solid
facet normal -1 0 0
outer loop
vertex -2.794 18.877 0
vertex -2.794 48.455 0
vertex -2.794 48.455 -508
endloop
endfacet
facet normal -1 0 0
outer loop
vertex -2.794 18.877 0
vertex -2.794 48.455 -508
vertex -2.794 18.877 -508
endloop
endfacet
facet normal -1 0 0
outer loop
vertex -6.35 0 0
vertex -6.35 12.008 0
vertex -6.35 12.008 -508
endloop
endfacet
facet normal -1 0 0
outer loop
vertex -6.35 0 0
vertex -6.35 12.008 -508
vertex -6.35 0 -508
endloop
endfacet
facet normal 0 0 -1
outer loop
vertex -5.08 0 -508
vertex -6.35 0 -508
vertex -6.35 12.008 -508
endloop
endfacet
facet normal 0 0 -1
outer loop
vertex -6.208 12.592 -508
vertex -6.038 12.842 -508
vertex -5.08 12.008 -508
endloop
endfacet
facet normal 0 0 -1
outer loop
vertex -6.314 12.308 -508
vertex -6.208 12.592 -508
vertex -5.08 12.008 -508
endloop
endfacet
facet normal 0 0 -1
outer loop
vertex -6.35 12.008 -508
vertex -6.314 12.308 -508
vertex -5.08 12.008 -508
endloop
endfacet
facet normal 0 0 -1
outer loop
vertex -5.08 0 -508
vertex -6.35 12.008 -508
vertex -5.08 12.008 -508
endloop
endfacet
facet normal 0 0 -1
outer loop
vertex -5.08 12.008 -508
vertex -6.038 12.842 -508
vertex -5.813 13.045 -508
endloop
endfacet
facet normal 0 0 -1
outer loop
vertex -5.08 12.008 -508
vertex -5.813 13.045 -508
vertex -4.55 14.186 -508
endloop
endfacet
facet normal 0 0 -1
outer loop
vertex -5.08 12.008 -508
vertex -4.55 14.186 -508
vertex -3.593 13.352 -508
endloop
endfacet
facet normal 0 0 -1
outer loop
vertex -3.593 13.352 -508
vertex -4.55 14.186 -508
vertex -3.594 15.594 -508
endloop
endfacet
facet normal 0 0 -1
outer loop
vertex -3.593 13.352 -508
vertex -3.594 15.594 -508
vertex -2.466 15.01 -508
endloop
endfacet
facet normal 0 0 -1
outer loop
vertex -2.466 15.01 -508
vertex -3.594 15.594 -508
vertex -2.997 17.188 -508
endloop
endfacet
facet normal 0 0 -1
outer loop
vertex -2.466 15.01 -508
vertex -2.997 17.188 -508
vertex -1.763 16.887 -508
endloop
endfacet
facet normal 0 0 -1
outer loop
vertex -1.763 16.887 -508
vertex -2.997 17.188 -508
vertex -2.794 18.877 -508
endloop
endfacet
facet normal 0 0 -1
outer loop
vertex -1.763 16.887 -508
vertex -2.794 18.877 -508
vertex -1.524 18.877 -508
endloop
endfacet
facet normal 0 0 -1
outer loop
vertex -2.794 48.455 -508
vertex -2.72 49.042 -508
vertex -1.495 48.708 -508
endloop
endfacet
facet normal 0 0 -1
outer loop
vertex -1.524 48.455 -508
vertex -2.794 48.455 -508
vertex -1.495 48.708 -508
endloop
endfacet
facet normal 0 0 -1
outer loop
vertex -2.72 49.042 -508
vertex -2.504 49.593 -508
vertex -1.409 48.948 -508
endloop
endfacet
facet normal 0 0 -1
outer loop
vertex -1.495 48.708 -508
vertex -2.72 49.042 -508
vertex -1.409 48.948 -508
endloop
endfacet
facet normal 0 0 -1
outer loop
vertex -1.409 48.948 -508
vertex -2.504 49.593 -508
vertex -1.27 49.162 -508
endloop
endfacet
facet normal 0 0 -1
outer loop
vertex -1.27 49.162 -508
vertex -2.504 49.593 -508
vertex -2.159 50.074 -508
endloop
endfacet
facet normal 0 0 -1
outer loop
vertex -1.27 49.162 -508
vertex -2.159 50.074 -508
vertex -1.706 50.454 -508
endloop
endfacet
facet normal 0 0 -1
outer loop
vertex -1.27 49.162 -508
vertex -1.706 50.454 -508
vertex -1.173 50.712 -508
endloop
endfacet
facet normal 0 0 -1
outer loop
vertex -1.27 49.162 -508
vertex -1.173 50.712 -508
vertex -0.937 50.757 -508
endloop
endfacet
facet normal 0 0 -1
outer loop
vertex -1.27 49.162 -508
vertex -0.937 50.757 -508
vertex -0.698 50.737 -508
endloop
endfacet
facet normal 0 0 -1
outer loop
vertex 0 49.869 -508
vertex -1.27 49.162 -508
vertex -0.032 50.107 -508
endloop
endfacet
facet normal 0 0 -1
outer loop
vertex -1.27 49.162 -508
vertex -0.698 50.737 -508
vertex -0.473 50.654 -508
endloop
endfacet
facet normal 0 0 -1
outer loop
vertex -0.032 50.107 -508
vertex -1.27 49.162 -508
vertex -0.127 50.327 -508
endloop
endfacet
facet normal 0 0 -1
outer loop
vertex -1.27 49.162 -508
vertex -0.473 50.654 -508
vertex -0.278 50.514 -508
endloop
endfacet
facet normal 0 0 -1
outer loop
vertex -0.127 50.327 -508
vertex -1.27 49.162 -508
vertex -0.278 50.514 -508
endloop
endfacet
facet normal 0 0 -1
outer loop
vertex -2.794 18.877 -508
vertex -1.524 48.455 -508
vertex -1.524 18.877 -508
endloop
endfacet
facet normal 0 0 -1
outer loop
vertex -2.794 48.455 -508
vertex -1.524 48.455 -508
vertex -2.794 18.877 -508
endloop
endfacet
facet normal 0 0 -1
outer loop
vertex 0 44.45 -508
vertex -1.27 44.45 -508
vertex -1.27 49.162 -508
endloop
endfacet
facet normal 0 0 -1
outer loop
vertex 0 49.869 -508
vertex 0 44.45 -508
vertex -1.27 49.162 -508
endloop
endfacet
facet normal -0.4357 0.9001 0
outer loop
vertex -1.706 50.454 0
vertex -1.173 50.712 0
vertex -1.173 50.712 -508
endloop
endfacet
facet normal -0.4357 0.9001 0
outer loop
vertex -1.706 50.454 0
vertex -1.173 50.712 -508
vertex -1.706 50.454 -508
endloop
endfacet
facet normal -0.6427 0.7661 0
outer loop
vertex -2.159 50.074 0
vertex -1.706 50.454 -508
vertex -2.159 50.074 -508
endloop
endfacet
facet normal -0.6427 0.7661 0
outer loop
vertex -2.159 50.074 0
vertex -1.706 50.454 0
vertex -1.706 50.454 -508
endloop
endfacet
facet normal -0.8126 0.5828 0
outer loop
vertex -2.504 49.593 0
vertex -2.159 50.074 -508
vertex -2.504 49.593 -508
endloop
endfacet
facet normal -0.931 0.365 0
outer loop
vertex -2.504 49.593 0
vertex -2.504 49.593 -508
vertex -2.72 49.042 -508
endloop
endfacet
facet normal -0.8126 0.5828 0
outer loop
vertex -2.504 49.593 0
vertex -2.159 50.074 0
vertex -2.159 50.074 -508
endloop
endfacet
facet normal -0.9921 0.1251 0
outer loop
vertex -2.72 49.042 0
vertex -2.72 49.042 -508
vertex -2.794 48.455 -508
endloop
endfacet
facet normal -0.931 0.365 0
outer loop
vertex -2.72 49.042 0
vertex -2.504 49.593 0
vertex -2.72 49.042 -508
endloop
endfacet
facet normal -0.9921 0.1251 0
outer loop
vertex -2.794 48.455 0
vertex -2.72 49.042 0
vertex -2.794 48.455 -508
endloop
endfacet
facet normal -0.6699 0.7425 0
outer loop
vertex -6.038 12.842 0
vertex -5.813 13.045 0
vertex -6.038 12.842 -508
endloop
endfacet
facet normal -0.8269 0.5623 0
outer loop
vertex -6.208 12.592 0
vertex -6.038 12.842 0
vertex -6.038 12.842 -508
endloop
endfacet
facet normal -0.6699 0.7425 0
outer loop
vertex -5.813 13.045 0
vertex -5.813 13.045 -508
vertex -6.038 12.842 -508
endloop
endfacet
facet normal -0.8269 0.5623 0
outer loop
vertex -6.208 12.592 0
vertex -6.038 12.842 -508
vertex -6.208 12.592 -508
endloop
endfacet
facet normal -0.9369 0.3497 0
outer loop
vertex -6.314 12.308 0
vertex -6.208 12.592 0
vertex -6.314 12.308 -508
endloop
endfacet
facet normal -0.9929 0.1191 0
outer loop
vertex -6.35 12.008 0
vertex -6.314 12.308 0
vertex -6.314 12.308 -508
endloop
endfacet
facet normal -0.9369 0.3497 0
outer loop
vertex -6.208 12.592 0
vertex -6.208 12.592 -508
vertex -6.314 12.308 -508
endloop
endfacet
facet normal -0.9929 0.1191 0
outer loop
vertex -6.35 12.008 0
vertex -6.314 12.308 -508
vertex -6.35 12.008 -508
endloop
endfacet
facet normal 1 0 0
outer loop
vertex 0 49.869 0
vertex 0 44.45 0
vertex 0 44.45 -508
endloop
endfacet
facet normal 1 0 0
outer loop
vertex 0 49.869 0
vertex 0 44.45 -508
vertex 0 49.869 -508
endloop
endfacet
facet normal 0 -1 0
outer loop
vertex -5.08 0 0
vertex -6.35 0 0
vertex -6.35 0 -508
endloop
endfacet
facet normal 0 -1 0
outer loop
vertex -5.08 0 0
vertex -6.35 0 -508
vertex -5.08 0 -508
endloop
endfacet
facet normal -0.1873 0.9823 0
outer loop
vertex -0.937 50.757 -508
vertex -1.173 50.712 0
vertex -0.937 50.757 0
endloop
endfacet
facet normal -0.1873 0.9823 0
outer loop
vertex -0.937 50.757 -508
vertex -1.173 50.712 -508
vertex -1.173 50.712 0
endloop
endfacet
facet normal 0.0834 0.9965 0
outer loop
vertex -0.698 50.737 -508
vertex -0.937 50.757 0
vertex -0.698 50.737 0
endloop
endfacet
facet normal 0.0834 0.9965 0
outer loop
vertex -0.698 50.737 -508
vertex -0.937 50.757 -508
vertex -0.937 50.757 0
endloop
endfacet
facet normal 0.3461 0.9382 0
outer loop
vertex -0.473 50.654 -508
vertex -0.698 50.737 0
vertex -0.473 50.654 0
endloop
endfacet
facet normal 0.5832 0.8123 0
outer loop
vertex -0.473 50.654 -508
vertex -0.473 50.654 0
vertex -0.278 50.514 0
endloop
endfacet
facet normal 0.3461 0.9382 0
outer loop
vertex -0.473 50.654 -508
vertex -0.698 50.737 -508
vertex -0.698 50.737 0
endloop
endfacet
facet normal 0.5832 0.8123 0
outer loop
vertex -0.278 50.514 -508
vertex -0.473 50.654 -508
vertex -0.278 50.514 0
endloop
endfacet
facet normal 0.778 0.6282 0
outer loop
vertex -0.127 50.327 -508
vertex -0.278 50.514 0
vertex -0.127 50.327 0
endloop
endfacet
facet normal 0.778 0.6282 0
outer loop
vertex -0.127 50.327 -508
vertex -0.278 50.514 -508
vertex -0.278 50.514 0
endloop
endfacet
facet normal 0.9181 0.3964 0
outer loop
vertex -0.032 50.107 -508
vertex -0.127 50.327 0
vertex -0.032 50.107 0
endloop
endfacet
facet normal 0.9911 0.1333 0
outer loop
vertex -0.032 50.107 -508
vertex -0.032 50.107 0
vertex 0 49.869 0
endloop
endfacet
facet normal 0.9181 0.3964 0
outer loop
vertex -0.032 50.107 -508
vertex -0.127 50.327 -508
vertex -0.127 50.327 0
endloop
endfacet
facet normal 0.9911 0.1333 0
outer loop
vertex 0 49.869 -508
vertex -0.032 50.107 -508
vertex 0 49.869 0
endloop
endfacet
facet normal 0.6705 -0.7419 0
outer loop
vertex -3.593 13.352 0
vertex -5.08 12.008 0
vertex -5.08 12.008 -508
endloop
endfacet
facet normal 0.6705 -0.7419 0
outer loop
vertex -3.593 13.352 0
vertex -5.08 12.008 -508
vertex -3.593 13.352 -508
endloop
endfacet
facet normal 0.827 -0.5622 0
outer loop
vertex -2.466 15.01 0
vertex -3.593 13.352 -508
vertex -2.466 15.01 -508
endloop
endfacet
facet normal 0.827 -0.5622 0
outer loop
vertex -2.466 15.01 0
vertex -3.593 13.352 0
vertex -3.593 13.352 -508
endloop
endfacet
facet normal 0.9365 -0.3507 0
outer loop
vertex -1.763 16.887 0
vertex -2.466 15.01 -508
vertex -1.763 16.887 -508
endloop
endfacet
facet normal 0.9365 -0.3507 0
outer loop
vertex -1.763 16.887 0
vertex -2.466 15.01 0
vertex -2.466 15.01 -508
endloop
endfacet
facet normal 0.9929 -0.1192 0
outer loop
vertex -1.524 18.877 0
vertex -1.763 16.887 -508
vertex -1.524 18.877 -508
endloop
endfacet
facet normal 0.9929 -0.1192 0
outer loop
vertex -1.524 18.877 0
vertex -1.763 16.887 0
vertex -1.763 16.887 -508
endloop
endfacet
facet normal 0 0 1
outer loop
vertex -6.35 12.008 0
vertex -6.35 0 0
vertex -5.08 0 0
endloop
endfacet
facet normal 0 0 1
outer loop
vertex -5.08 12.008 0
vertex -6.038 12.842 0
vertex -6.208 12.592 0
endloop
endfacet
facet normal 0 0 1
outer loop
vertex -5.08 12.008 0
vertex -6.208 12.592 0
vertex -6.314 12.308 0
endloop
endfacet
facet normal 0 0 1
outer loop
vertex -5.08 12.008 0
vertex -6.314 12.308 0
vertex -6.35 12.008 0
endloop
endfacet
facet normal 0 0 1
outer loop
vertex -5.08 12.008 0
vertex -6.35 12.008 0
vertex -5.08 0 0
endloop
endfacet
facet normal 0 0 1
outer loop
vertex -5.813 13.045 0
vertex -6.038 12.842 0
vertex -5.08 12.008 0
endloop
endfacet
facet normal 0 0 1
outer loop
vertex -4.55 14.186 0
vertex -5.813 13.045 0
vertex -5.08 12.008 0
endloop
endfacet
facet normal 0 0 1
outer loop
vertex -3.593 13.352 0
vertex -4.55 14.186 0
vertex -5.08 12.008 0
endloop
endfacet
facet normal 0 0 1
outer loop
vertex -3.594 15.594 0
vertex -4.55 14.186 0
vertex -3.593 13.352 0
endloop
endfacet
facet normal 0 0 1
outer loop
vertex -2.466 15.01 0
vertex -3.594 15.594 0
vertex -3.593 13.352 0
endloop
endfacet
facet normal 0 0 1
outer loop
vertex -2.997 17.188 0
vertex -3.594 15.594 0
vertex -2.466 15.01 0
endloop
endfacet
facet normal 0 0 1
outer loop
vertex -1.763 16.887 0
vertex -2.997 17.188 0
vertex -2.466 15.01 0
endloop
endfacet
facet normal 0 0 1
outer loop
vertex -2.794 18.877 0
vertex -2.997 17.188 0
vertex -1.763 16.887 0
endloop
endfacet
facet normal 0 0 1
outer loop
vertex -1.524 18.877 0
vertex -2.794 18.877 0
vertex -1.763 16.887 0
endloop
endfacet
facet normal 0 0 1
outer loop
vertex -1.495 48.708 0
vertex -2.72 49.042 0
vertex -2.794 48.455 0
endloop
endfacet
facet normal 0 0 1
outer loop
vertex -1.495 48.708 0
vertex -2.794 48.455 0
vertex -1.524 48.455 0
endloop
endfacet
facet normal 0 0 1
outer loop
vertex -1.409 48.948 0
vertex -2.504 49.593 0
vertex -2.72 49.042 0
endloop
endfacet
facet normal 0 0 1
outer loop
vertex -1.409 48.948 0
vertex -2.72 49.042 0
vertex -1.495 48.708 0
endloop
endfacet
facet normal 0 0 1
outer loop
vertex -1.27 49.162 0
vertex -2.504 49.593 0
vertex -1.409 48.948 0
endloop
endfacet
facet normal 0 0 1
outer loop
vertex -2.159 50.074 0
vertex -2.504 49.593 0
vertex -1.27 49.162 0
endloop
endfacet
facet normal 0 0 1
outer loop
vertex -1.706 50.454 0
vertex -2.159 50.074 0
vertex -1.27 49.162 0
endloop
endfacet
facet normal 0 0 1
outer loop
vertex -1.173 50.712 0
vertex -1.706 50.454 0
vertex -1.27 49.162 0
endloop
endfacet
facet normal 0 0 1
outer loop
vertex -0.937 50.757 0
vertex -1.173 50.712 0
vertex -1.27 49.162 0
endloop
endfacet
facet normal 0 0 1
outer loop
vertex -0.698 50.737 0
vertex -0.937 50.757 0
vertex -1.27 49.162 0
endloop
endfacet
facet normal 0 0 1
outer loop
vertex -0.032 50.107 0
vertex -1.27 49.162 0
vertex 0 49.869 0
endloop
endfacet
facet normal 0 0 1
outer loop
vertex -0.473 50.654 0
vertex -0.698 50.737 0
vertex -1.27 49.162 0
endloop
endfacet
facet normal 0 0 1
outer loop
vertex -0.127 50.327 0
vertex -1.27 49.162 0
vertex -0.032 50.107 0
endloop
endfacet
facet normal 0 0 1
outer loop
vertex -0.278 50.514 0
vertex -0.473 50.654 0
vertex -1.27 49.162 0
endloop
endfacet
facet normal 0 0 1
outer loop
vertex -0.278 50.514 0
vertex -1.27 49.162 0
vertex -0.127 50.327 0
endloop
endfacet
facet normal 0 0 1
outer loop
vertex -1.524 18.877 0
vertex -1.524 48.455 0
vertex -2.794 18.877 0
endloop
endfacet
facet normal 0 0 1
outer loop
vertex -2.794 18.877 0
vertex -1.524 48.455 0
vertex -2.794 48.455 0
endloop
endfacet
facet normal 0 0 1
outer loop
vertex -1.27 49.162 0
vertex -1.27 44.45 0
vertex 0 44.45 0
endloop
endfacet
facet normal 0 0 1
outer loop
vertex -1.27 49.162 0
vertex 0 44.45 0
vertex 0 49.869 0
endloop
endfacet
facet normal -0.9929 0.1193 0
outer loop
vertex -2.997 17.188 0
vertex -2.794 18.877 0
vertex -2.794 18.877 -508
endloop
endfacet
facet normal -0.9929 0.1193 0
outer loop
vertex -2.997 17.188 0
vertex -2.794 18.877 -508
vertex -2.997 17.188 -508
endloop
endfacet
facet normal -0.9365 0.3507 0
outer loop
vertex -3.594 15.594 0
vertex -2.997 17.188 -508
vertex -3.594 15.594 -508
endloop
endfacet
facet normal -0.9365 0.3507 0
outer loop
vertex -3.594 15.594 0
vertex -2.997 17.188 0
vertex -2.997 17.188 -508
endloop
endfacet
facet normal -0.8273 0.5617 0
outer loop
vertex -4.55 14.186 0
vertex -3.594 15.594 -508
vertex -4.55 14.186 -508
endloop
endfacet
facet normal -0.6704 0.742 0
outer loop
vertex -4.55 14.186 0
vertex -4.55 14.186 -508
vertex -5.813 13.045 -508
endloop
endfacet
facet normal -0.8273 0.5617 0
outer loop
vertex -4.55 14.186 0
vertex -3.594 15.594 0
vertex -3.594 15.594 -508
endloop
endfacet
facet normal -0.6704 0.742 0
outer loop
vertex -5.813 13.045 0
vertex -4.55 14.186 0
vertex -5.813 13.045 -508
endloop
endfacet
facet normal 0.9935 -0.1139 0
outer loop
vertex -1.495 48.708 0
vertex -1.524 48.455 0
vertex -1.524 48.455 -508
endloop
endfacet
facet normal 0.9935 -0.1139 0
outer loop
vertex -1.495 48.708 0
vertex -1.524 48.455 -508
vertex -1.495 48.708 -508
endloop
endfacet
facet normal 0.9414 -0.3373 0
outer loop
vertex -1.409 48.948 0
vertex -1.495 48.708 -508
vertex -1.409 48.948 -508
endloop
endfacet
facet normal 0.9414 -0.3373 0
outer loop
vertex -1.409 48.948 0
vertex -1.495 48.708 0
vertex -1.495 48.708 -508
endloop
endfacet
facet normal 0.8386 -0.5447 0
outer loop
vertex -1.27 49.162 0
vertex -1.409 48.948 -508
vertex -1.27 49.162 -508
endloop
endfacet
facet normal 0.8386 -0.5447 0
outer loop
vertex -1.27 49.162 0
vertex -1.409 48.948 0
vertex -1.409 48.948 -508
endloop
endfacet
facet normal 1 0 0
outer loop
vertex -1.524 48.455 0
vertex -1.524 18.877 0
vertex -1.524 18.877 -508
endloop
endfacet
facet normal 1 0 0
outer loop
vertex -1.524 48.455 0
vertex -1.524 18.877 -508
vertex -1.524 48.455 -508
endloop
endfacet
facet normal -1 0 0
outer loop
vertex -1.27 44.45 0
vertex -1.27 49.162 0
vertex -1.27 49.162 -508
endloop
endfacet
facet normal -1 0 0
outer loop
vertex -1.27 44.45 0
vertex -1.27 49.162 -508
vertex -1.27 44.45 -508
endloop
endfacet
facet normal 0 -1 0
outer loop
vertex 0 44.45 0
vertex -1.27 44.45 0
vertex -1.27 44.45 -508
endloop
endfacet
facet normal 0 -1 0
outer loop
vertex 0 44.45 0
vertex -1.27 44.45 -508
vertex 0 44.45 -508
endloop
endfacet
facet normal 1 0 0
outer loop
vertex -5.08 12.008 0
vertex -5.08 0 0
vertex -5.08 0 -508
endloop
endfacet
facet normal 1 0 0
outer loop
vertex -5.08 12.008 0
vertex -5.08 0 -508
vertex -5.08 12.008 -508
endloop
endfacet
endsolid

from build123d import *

# Parameters (mm, degrees)
EXTRUDE_THIN1_DEPTH = 508
FILLET1_R           = 1.27
FILLET2_R           = 0.889


with BuildPart() as part:
    # Sketch1 → Extrude-Thin1 (new body)
    with BuildSketch(Plane.XY):
        with BuildLine():
            Line((0, 44.45), (0, 50.8))
            ThreePointArc((0, 50.8), (-1.943679558, 50.278693106), (-2.794, 48.454794465))
            Line((-2.794, 48.454794465), (-2.794, 18.877476346))
            ThreePointArc((-2.794, 18.877476346), (-3.7465, 15.313547685), (-6.35, 12.7))
            Line((-6.35, 12.7), (-6.35, 0))
            Line((-6.35, 0), (-5.08, 0))
            Line((-5.08, 0), (-5.08, 12.007727151))
            ThreePointArc((-5.08, 12.007727151), (-2.465699307, 15.009705993), (-1.524, 18.877476346))
            Line((-1.524, 18.877476346), (-1.524, 48.454794465))
            ThreePointArc((-1.524, 48.454794465), (-1.458573987, 48.830465532), (-1.27, 49.161900539))
            Line((-1.27, 49.161900539), (-1.27, 44.45))
            Line((-1.27, 44.45), (0, 44.45))
        make_face()
    extrude(amount=-EXTRUDE_THIN1_DEPTH)

    # Fillet1
    fillet1_edges = [part.edges().sort_by_distance(p)[0] for p in [
        (-6.35, 12.7, -254),
    ]]
    fillet(fillet1_edges, radius=FILLET1_R)

    # Fillet2
    fillet2_edges = [part.edges().sort_by_distance(p)[0] for p in [
        (0, 50.8, -254),
    ]]
    fillet(fillet2_edges, radius=FILLET2_R)


solid = part.part
